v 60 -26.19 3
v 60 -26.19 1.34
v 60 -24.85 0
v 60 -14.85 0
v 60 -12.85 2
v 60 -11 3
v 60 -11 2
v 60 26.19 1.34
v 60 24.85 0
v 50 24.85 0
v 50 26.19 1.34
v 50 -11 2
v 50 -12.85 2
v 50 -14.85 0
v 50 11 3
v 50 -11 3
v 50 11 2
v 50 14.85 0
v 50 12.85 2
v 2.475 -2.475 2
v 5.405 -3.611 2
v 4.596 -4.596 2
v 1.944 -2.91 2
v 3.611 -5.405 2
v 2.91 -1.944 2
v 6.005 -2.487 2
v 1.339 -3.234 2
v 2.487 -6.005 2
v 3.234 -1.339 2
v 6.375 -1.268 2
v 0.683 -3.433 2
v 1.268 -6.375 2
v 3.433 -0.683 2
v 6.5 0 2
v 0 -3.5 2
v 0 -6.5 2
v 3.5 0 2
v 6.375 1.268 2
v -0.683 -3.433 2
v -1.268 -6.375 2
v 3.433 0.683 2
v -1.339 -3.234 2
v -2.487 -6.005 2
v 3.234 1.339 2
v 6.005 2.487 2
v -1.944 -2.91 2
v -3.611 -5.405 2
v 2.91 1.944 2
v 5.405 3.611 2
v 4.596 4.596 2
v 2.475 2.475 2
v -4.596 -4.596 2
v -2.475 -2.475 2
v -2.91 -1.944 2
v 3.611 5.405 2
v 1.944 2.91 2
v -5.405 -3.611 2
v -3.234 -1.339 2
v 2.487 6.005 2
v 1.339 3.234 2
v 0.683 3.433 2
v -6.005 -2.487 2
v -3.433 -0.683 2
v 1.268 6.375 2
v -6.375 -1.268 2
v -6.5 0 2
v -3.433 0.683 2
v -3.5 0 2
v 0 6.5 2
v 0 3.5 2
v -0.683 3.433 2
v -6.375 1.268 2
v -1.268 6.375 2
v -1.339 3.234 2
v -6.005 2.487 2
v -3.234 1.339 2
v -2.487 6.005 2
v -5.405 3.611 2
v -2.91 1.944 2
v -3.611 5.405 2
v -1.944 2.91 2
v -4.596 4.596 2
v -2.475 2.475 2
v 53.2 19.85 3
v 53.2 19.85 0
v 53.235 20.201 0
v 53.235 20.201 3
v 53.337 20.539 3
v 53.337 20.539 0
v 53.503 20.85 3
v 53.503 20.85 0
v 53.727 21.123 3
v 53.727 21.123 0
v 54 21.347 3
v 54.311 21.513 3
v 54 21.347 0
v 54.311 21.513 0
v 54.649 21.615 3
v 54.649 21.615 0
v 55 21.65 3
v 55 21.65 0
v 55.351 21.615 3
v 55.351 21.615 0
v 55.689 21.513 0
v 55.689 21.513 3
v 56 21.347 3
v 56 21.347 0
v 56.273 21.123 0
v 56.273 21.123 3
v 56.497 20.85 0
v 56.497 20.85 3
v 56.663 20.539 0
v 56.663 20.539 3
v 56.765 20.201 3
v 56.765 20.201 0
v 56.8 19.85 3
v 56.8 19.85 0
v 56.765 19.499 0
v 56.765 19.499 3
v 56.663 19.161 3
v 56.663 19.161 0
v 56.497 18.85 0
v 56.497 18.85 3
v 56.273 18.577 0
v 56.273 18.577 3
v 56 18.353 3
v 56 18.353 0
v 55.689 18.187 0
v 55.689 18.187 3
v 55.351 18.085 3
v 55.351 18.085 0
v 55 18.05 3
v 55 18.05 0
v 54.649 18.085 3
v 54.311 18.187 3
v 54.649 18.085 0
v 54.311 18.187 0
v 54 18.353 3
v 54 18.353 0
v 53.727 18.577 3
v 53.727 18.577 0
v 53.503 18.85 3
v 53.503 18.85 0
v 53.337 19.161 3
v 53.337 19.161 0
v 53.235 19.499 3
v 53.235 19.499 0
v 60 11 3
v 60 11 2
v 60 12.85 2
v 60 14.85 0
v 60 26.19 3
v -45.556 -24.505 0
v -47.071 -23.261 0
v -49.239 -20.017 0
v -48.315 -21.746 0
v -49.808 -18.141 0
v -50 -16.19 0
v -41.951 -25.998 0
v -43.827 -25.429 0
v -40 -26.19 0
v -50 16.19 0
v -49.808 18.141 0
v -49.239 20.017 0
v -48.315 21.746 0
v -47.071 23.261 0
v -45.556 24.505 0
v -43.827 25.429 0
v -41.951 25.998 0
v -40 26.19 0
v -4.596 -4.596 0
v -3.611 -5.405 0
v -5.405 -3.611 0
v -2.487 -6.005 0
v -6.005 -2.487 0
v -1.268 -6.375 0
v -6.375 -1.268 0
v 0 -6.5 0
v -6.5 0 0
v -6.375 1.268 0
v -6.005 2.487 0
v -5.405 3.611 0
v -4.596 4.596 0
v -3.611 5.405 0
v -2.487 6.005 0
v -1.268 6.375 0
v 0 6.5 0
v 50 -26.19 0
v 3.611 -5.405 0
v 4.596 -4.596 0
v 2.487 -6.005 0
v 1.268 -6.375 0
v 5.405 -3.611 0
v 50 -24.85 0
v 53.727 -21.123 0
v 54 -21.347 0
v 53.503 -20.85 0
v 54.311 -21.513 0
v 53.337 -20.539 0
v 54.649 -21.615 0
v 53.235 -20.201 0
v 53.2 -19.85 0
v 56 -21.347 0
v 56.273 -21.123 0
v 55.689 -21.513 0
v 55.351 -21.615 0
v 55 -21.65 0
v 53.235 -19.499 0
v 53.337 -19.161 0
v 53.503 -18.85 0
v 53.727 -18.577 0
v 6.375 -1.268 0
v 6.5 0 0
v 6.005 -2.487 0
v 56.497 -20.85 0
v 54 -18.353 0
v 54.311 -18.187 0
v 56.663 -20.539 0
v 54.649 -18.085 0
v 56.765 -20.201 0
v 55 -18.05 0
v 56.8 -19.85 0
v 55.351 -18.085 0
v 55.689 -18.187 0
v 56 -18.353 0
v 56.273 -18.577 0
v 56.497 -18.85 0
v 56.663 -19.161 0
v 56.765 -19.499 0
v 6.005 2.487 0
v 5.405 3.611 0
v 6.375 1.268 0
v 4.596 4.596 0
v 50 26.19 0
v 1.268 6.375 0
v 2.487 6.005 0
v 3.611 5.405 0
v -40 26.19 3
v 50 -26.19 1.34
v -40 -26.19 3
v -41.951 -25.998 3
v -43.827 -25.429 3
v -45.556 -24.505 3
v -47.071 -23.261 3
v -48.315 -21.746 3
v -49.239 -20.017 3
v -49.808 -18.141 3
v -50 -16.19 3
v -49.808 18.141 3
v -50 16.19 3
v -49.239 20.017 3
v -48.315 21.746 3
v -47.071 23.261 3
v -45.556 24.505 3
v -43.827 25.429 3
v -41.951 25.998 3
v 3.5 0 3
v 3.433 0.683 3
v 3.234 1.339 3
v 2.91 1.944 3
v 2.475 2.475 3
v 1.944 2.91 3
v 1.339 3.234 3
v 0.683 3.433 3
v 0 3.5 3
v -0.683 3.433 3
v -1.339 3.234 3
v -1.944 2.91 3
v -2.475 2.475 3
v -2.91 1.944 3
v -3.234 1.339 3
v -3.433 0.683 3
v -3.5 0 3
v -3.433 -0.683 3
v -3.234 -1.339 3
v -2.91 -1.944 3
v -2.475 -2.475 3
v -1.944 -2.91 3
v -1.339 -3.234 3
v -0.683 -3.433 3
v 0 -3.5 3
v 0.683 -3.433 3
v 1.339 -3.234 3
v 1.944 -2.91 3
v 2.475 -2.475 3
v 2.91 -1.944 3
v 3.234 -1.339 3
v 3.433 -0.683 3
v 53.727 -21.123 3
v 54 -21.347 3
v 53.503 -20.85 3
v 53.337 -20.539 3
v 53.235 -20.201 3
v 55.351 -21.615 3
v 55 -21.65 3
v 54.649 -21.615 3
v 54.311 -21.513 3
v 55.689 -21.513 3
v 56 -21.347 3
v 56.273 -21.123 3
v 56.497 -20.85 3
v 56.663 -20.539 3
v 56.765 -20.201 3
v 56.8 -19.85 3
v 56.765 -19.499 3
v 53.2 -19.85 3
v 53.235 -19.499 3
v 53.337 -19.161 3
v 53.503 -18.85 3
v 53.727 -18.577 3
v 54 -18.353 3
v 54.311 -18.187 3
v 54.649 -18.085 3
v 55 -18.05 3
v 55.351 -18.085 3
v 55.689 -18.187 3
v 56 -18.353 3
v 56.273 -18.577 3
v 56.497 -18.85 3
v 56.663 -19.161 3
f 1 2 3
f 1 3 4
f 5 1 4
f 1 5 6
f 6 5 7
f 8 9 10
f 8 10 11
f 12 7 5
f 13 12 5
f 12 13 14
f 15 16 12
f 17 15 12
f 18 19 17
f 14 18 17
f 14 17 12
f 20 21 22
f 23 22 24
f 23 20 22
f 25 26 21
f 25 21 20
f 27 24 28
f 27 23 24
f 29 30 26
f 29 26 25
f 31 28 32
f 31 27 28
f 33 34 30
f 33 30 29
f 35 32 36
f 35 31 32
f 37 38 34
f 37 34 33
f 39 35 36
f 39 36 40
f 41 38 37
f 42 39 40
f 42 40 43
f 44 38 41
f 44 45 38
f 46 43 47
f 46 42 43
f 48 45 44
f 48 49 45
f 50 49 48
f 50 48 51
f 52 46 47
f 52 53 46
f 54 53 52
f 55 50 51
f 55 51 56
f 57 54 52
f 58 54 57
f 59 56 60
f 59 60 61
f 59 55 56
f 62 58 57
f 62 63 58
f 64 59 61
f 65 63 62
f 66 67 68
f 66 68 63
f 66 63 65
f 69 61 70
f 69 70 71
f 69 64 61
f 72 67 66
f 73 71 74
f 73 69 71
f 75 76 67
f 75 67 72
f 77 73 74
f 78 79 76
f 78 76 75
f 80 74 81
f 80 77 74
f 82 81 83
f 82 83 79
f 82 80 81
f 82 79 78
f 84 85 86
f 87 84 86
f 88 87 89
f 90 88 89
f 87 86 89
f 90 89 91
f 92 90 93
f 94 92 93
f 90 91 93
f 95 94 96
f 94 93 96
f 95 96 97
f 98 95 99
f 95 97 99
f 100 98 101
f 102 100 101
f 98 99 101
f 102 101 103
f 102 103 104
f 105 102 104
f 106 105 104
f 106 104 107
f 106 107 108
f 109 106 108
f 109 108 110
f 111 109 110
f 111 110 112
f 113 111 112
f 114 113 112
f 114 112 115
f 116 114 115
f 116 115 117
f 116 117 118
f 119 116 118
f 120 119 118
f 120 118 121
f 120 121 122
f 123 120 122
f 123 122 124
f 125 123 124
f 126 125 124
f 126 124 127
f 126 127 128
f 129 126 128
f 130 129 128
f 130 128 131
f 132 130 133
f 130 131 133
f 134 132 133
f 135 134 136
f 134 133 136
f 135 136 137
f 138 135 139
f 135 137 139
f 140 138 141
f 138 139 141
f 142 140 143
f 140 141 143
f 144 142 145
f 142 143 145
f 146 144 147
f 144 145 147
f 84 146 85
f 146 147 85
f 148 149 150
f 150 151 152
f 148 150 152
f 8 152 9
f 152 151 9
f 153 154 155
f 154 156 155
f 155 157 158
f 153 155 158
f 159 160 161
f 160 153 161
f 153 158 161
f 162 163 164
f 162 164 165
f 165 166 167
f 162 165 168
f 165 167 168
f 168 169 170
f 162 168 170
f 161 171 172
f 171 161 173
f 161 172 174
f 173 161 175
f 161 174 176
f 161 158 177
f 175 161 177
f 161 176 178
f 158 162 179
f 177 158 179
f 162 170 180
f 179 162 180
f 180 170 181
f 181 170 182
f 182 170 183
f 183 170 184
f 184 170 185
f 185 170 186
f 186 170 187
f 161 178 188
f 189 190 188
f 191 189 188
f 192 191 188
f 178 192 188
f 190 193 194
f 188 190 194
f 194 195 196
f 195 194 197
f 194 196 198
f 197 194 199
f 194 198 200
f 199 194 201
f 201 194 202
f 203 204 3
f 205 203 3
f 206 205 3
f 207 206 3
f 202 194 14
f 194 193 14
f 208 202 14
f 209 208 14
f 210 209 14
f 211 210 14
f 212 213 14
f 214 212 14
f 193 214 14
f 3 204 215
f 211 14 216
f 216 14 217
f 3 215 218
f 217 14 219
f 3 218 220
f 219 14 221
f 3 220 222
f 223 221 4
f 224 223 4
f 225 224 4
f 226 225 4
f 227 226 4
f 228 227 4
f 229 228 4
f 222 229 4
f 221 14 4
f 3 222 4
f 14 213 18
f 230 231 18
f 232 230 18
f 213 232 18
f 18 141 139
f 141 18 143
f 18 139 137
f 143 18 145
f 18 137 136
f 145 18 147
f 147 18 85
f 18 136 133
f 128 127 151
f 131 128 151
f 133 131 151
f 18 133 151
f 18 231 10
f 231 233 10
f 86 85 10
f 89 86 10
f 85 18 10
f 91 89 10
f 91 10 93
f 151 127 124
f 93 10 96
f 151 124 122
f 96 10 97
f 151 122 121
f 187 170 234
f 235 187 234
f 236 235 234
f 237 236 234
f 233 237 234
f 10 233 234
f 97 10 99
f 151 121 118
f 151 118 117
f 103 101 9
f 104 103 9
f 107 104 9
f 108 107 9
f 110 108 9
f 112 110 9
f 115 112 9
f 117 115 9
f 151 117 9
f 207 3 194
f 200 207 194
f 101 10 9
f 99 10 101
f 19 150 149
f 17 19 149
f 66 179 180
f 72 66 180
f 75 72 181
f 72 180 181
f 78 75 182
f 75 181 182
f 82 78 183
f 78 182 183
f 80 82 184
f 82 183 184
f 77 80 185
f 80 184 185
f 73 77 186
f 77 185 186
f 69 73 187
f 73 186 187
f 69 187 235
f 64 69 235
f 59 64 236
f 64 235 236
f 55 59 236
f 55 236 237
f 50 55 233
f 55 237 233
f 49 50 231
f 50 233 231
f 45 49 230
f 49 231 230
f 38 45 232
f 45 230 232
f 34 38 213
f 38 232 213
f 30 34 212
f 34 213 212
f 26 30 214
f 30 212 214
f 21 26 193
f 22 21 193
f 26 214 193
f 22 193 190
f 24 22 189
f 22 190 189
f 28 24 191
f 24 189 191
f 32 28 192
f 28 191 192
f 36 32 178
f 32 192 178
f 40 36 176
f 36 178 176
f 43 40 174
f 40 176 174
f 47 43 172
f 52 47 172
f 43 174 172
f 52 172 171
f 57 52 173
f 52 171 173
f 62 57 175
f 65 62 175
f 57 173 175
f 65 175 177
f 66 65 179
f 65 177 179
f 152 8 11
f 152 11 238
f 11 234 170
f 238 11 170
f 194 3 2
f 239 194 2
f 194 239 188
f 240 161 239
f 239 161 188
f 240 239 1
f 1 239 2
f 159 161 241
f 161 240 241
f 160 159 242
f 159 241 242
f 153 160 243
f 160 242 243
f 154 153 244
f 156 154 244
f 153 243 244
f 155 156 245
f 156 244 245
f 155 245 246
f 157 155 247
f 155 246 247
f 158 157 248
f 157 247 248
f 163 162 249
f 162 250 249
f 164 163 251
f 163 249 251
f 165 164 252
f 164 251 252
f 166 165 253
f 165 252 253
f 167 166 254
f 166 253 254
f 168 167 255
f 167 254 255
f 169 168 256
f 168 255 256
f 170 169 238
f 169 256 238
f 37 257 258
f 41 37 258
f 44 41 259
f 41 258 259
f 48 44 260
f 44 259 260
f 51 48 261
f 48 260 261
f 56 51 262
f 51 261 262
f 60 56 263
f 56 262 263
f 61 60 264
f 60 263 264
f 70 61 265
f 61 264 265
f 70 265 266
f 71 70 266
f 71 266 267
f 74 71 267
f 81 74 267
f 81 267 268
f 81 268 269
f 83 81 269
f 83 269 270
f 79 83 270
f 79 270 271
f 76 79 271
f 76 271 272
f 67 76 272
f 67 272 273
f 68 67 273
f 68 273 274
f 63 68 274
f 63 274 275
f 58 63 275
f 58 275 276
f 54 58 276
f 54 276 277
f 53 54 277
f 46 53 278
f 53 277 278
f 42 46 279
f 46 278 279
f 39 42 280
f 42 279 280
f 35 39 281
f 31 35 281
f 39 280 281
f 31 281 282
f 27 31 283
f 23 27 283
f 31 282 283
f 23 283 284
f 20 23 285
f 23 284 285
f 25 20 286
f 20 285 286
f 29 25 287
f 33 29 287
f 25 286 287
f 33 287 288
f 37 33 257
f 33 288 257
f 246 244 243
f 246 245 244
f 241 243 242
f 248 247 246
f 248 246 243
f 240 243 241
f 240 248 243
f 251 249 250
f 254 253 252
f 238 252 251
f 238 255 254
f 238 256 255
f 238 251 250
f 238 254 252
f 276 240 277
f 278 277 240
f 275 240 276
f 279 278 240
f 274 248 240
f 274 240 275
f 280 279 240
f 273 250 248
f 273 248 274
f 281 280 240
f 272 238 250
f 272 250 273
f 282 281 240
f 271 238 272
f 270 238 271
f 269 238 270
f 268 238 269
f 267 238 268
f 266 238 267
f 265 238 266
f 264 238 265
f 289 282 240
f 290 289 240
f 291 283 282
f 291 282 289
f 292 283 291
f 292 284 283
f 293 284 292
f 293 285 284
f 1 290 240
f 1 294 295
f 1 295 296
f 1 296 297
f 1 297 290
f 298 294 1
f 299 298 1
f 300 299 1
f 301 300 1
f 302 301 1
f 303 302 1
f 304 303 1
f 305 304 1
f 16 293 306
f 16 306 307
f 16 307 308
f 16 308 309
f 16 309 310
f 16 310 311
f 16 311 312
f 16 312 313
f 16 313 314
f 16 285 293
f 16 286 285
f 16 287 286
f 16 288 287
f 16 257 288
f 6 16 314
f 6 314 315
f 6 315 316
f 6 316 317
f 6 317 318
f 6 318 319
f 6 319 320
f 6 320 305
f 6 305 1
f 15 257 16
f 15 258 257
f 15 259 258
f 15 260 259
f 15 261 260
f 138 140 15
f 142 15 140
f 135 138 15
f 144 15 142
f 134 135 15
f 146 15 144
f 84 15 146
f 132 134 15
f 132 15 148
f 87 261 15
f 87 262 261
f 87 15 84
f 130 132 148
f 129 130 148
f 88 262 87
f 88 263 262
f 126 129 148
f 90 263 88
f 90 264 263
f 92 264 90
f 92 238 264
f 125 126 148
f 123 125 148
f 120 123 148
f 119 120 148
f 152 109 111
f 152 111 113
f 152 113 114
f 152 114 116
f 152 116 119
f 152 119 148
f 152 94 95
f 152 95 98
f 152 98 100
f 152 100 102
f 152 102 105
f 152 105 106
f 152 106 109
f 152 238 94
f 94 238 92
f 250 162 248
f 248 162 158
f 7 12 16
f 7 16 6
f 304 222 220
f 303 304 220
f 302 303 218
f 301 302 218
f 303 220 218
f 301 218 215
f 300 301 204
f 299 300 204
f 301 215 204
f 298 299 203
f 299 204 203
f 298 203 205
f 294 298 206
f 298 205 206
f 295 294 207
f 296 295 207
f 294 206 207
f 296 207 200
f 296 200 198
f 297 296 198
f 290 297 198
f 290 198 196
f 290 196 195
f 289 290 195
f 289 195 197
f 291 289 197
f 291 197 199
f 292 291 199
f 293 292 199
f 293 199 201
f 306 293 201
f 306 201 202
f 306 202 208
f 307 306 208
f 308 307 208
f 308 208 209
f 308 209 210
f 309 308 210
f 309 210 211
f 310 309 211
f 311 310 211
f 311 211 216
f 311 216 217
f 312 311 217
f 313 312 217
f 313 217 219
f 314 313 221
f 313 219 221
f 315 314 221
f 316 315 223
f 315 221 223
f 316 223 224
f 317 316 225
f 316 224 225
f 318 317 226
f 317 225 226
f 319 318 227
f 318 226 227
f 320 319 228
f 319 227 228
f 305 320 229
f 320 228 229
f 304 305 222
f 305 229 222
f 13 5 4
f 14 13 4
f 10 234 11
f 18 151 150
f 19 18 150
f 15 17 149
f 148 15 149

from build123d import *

# Parameters (mm, degrees)
ESBO_O1_W                = 10
ESBO_O1_H                = 15.19
RESSALTO_EXTRUS_O1_DEPTH = 3
CORTE_EXTRUS_O1_DEPTH    = 10
ESBO_O3_R                = 1.8
CORTE_EXTRUS_O2_DEPTH    = 66.535609404
ESBO_O4_R                = 3.5
CORTE_EXTRUS_O3_DEPTH    = 66.535609404
ESBO_O5_R                = 6.5
CORTE_EXTRUS_O4_DEPTH    = 2
FILETE1_R                = 10


with BuildPart() as part:
    # Esboço1 → Ressalto-extrusão1 (new body)
    with BuildSketch(Plane.XY):
        Polygon((-50, -26.19), (50, -26.19), (50, -11), (50, 11), (50, 26.19), (-50, 26.19), align=None)
        with Locations((55, -18.595)):
            Rectangle(ESBO_O1_W, ESBO_O1_H)
        with Locations((55, 18.595)):
            Rectangle(ESBO_O1_W, ESBO_O1_H)
    extrude(amount=RESSALTO_EXTRUS_O1_DEPTH)

    # Esboço2 → Corte-extrusão1 (cut)
    with BuildSketch(Plane(origin=(60, 0, 0), x_dir=(0, 0, -1), z_dir=(1, 0, 0))):
        Polygon((-2, -11), (-2, -12.85), (0, -14.85), (0, -11), align=None)
        Polygon((0, -24.85), (-1.34, -26.19), (0, -26.19), align=None)
        Polygon((0, 11), (0, 14.85), (-2, 12.85), (-2, 11), align=None)
        Polygon((0, 26.19), (0, 24.85), (-1.34, 26.19), align=None)
    extrude(amount=-CORTE_EXTRUS_O1_DEPTH, mode=Mode.SUBTRACT)

    # Esboço3 → Corte-extrusão2 (cut, through all)
    with BuildSketch(Plane(origin=(0, 0, 0), x_dir=(-1, 0, 0), z_dir=(0, 0, -1))):
        with Locations((-55, 19.85)):
            Circle(ESBO_O3_R)
        with Locations(Location((-55, -19.85, 0), (0, 0, 180))):
            Circle(ESBO_O3_R)
    extrude(amount=-CORTE_EXTRUS_O2_DEPTH, mode=Mode.SUBTRACT)

    # Esboço4 → Corte-extrusão3 (cut, through all)
    with BuildSketch(Plane.XY.offset(3)):
        Circle(ESBO_O4_R)
    extrude(amount=-CORTE_EXTRUS_O3_DEPTH, mode=Mode.SUBTRACT)

    # Esboço5 → Corte-extrusão4 (cut)
    with BuildSketch(Plane(origin=(0, 0, 0), x_dir=(-1, 0, 0), z_dir=(0, 0, -1))):
        Circle(ESBO_O5_R)
    extrude(amount=-CORTE_EXTRUS_O4_DEPTH, mode=Mode.SUBTRACT)

    # Filete1
    filete1_edges = [part.edges().sort_by_distance(p)[0] for p in [
        (-50, -26.19, 1.5),
        (-50, 26.19, 1.5),
    ]]
    fillet(filete1_edges, radius=FILETE1_R)


solid = part.part
